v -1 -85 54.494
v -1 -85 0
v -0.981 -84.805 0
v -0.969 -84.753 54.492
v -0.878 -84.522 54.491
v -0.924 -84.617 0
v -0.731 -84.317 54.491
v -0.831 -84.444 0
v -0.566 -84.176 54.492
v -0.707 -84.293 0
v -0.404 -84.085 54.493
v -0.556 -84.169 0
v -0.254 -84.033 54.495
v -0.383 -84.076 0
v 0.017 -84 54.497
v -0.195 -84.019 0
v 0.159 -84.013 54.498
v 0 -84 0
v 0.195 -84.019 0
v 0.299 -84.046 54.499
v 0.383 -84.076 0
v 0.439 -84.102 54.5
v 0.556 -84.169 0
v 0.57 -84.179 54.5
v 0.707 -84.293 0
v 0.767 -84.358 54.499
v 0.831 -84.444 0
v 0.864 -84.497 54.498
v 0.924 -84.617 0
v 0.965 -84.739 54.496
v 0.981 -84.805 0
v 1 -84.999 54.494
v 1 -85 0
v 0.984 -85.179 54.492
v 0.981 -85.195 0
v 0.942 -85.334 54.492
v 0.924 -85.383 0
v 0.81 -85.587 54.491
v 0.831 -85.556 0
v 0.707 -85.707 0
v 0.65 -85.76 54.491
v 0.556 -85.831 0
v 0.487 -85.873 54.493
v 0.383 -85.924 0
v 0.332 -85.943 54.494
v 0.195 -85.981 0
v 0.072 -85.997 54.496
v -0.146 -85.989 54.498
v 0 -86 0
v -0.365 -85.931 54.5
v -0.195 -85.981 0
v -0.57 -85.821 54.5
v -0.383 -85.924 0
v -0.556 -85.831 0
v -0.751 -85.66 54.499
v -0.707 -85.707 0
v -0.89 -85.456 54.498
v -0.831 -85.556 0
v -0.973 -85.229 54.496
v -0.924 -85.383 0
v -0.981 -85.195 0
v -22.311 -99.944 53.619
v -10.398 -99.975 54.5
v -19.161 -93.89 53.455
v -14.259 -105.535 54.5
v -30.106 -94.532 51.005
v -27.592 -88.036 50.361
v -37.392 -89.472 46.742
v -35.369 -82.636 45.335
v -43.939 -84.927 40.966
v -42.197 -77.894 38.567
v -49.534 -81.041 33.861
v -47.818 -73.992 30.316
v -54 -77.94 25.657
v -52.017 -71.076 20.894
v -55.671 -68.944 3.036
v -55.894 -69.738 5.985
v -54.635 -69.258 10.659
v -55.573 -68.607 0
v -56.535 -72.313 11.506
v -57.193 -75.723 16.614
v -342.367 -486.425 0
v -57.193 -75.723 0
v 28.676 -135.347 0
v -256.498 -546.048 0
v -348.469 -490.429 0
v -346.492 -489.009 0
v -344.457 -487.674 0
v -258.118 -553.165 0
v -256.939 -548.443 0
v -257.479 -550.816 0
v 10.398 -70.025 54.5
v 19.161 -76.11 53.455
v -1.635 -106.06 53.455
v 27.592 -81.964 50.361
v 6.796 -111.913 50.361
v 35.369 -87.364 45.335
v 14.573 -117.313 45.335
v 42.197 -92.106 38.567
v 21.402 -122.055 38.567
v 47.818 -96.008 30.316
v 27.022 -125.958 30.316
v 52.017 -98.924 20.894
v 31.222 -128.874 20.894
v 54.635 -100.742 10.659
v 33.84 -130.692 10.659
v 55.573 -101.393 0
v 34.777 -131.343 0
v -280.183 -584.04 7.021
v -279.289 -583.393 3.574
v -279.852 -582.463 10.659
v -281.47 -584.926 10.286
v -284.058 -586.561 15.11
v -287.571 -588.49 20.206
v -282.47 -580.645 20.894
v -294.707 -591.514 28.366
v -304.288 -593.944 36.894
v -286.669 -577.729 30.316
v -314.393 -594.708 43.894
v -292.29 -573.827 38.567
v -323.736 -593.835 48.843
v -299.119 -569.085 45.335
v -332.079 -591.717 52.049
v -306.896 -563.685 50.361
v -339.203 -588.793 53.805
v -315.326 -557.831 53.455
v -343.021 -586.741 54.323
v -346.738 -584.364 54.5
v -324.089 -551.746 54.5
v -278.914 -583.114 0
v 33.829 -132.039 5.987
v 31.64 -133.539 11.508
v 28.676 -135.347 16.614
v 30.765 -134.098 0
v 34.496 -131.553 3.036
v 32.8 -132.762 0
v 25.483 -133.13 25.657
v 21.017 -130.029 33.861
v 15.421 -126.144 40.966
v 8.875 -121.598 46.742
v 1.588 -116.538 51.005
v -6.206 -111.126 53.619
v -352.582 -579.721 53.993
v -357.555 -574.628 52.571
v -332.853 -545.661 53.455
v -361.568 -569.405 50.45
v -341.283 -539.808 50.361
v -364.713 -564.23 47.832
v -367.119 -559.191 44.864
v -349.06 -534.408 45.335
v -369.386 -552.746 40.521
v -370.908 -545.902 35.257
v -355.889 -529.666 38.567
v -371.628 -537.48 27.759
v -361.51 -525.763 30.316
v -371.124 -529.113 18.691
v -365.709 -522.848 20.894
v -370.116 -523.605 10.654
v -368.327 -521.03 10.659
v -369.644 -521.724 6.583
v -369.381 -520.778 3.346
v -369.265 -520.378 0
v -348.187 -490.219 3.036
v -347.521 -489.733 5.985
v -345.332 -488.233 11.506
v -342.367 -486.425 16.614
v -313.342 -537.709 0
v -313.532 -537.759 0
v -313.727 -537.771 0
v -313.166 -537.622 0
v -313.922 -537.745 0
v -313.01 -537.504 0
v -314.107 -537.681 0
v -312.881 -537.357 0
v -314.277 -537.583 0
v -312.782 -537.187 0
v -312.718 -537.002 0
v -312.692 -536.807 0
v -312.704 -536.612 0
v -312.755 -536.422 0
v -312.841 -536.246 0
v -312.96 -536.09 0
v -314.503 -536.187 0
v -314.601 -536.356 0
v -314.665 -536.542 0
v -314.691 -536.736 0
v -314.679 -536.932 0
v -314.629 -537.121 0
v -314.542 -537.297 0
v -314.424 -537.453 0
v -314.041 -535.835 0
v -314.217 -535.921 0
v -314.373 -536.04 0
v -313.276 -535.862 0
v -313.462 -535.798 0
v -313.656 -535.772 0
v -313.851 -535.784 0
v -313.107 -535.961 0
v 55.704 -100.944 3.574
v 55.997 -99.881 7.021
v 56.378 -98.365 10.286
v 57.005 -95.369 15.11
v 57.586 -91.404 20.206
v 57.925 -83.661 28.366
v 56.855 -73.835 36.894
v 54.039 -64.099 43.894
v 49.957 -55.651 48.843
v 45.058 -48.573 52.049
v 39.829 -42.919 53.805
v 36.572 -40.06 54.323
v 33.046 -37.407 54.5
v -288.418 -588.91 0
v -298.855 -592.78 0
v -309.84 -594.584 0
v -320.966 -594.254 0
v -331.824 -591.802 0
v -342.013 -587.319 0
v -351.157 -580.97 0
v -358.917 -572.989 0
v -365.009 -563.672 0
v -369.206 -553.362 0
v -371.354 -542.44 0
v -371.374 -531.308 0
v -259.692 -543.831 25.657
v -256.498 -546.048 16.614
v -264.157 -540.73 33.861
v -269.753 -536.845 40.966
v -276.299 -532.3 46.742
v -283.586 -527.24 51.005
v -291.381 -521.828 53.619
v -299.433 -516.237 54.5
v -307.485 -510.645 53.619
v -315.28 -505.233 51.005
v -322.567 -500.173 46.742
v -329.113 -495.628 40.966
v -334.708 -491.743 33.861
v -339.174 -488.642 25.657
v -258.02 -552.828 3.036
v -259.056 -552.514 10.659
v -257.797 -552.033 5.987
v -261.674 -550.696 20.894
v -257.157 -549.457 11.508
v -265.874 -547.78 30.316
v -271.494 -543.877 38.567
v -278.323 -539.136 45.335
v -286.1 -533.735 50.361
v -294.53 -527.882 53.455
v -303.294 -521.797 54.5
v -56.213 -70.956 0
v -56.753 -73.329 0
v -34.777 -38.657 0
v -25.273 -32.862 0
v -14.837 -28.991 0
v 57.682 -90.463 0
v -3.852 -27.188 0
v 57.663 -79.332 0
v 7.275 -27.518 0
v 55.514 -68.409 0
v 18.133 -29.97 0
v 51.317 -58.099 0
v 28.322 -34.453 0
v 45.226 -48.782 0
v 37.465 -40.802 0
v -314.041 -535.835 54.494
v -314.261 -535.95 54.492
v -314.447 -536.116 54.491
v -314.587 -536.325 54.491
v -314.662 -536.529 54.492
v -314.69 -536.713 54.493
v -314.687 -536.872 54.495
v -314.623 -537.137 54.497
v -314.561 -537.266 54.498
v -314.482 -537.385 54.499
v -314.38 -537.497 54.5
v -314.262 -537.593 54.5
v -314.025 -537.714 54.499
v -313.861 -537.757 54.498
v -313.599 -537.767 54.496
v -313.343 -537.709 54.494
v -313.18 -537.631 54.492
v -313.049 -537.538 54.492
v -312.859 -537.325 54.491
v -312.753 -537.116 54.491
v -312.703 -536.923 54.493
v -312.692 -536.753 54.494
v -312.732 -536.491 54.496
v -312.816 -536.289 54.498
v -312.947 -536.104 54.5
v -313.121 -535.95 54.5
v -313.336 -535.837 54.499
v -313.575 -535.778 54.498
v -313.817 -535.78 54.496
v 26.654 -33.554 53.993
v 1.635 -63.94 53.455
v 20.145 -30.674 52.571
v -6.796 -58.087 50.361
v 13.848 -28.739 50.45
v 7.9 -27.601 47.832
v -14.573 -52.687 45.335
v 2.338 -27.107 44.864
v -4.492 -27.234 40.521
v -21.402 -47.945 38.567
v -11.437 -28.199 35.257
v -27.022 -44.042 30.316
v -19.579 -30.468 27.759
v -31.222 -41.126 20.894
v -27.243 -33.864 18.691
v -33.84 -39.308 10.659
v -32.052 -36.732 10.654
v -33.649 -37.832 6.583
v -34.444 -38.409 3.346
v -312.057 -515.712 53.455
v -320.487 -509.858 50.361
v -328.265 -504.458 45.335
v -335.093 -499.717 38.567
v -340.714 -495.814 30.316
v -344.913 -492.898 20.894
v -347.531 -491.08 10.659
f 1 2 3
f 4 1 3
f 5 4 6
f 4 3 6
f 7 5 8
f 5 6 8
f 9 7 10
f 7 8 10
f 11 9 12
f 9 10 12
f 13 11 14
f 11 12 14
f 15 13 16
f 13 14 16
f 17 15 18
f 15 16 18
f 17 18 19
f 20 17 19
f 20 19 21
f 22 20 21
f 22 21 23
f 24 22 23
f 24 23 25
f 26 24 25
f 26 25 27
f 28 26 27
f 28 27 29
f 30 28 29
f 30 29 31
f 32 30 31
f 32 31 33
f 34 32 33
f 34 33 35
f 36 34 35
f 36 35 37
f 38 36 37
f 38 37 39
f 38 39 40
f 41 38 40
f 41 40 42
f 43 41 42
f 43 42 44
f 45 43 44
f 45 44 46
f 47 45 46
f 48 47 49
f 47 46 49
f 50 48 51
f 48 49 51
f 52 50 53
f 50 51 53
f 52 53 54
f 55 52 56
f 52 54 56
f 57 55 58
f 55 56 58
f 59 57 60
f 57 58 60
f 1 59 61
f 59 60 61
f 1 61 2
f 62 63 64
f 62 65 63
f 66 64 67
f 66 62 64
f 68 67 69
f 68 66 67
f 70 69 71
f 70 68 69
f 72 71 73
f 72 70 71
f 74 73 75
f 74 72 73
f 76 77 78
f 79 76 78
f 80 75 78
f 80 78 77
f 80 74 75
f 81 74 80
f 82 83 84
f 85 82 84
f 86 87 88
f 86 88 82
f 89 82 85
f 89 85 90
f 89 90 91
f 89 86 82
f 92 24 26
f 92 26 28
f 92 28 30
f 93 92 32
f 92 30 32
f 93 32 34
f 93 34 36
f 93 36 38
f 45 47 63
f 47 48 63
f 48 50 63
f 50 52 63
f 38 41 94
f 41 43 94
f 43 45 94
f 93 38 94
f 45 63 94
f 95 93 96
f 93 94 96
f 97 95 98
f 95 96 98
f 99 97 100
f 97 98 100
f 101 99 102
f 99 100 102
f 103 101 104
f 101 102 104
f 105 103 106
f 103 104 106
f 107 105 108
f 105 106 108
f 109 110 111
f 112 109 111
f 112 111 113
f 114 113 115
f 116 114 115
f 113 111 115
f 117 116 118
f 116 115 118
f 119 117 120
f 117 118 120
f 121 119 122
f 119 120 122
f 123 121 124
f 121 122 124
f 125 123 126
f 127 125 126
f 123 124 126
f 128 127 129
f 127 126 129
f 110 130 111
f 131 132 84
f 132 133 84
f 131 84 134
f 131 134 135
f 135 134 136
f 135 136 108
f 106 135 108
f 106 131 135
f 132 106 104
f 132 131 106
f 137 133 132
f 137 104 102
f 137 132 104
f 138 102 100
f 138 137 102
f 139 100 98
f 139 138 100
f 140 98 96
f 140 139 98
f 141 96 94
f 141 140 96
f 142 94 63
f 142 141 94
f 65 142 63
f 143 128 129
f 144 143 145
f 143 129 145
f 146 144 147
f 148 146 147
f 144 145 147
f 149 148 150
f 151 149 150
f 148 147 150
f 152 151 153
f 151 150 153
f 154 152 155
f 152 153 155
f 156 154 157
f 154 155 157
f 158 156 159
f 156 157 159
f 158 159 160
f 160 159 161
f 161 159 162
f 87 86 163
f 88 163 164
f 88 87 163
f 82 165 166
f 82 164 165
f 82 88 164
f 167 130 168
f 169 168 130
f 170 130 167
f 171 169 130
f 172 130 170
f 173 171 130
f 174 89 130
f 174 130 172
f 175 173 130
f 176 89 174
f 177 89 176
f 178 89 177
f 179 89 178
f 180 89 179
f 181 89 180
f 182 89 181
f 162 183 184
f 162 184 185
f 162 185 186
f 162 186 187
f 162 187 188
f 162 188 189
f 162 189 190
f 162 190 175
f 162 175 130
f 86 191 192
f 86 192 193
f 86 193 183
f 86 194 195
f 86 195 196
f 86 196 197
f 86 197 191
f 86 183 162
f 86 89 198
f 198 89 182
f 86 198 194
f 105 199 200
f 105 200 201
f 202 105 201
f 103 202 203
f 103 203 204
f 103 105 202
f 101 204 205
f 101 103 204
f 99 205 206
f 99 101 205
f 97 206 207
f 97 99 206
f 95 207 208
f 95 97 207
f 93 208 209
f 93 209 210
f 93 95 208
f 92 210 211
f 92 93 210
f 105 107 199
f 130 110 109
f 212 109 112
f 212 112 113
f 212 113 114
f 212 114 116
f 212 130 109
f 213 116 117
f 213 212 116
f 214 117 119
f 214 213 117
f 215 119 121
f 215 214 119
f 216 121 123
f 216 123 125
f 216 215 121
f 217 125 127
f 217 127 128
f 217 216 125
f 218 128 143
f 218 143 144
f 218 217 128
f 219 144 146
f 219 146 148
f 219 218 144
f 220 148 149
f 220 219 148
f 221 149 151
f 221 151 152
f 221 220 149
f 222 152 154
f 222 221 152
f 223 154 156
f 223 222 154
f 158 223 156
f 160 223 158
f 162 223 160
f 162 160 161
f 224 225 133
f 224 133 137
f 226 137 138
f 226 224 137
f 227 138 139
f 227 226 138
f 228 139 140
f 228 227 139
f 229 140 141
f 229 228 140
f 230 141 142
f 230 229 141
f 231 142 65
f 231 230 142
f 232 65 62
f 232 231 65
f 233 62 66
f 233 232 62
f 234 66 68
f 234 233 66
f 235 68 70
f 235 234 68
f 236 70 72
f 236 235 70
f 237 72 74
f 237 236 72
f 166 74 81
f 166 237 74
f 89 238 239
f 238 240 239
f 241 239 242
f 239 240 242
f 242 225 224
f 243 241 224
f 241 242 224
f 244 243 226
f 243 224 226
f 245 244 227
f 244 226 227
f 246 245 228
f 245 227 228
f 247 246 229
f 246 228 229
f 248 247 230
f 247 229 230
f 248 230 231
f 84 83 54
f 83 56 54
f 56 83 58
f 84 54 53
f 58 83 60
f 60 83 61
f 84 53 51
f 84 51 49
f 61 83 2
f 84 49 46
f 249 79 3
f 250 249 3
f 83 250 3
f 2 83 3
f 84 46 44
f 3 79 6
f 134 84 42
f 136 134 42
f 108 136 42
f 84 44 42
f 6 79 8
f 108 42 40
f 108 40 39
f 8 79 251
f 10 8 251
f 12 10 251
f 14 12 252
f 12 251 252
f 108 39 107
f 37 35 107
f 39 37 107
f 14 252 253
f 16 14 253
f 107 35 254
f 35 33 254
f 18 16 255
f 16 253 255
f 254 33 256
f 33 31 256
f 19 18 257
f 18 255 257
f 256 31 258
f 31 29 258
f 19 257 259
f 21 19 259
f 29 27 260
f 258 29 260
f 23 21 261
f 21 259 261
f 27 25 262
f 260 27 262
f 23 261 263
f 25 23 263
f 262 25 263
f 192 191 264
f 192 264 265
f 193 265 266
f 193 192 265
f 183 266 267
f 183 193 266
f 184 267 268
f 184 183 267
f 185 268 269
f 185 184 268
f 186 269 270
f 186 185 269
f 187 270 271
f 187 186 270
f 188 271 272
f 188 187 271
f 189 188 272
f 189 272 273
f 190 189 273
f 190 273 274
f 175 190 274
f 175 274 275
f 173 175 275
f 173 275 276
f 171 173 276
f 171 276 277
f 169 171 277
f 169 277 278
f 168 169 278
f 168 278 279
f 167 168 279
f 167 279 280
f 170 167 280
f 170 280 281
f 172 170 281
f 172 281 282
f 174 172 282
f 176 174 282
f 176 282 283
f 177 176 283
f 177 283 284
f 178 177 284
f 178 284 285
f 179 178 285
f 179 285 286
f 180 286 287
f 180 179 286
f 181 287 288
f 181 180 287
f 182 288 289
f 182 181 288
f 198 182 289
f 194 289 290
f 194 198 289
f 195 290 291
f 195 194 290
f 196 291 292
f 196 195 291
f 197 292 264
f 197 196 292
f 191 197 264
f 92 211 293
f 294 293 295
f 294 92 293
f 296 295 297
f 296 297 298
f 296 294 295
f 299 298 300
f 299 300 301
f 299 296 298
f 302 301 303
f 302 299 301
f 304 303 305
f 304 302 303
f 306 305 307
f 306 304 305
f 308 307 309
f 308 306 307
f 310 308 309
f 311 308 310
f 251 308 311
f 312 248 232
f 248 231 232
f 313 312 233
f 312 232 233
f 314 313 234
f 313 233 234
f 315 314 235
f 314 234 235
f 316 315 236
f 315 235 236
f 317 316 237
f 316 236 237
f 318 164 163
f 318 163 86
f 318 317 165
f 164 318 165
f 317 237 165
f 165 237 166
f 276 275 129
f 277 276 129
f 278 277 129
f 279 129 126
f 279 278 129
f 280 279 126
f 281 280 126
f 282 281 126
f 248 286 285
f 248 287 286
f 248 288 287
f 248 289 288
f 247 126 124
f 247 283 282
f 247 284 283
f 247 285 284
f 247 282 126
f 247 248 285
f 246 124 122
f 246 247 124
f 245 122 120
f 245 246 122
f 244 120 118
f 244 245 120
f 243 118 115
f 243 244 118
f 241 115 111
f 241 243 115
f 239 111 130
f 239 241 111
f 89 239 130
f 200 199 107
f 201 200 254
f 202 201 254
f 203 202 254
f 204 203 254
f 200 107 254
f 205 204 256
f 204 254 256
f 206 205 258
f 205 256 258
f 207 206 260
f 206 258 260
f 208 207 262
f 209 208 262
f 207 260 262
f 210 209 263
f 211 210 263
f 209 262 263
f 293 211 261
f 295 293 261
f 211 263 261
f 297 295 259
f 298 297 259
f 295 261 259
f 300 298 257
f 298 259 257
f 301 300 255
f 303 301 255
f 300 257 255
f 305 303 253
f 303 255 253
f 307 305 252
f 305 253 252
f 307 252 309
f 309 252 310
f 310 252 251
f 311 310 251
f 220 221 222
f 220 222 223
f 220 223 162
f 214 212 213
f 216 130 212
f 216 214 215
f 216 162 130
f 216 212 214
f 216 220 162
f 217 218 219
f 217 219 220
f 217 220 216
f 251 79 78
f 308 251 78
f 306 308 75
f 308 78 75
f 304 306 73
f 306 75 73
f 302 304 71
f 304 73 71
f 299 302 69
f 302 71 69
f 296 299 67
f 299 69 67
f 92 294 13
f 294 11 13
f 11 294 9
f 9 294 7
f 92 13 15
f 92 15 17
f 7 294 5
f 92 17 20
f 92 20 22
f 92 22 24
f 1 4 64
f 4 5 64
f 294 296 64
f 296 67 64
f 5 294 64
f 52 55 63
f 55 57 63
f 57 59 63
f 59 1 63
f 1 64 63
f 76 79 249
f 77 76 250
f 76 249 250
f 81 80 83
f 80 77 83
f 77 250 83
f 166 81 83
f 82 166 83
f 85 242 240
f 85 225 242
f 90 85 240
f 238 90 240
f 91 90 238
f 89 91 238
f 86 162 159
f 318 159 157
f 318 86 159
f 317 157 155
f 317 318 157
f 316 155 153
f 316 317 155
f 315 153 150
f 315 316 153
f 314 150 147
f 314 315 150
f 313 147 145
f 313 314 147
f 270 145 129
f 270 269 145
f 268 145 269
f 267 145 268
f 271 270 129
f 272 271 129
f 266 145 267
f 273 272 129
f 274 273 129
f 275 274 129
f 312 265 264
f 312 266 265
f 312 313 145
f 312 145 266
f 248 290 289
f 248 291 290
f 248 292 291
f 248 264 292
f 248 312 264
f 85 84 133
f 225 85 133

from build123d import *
from build123d.topology import SkipClean

# Parameters (mm, degrees)
BOSS_EXTRUDE1_START     = -88.049944887
BOSS_EXTRUDE1_DEPTH     = 36.461390913
BOSS_EXTRUDE1_2_DEPTH   = 54.5
BOSS_EXTRUDE1_START_2   = -94.81924943
BOSS_EXTRUDE1_3_DEPTH   = 83.81924943
CUT_EXTRUDE2_REACH      = 158.991
CUT_EXTRUDE2_END_RADIUS = 55
SKETCH6_R               = 1
BOSS_EXTRUDE3_START     = 500
BOSS_EXTRUDE3_DEPTH     = 500


with BuildPart() as part:
    # Boss-Extrude1: read off the stored shape, not the designer's step
    # Boss-Extrude1 outline → Boss-Extrude1 (new body)
    with BuildSketch(Plane(origin=(0, 0, 0), x_dir=(0.8214029344741598, -0.570348331493342, 0), z_dir=(0.570348331493342, 0.8214029344741599, 0)).offset(BOSS_EXTRUDE1_START)):
        with BuildLine():
            Line((103.477335403, 0), (-6.518119049, 0))
            ThreePointArc((-6.518119049, 0), (48.479608177, -54.5), (103.477335403, 0))
        make_face()
    boss_extrude1 = extrude(amount=BOSS_EXTRUDE1_DEPTH)

    # Boss-Extrude1 2 outline → Boss-Extrude1 2 (add)
    with BuildSketch(Plane.XY):
        with BuildLine():
            ThreePointArc((-55.573141325, -68.606884869), (-56.495275826, -72.13951518), (-57.193088924, -75.72320962))
            Line((-57.193088924, -75.72320962), (28.67567235, -135.346937104))
            ThreePointArc((28.67567235, -135.346937104), (31.789672436, -133.440943291), (34.77744774, -131.342608787))
            Line((34.77744774, -131.342608787), (-55.573141325, -68.606884869))
        make_face()
        with BuildLine():
            ThreePointArc((55.573141325, -101.393115131), (33.046300577, -37.40745564), (-34.77744774, -38.657391213))
            Line((-34.77744774, -38.657391213), (55.573141325, -101.393115131))
        make_face()
    boss_extrude1_2 = extrude(amount=BOSS_EXTRUDE1_2_DEPTH)

    # Boss-Extrude1 3 outline → Boss-Extrude1 3 (cut)
    with SkipClean():  # the faces are left unmerged after this step: merging them gives an invalid solid
        with BuildSketch(Plane(origin=(0, 0, 0), x_dir=(0.8214029344741598, -0.570348331493342, 0), z_dir=(0.570348331493342, 0.8214029344741599, 0)).offset(BOSS_EXTRUDE1_START_2)):
            with BuildLine():
                ThreePointArc((48.479608177, -54.5), (9.765915509, -38.567249711), (-6.518119049, 0))
                Line((-6.518119049, 0), (-6.536301619, 2))
                Line((-6.536301619, 2), (-8, 2))
                Line((-8, 2), (-8, -56))
                Line((-8, -56), (105, -56))
                Line((105, -56), (105, 2))
                Line((105, 2), (103.495517973, 2))
                Line((103.495517973, 2), (103.477335403, 0))
                ThreePointArc((103.477335403, 0), (87.193300845, -38.567249711), (48.479608177, -54.5))
            make_face()
        boss_extrude1_3 = extrude(amount=BOSS_EXTRUDE1_3_DEPTH, mode=Mode.SUBTRACT)

    # Cut-Extrude2: up to this cylinder (the profile starts inside it)
    with SkipClean():  # the faces are left unmerged after this step: merging them gives an invalid solid
        cut_extrude2_end = Plane(origin=(0, -85, -0.5), z_dir=(0.5703483314933416, 0.82140293447416, 0)) * Cylinder(CUT_EXTRUDE2_END_RADIUS, 428.982, mode=Mode.PRIVATE)
        # Sketch6 → Cut-Extrude2 (cut, up to the surface)
        with BuildSketch(Plane(origin=(0, 0, 0), x_dir=(-1, 0, 0), z_dir=(0, 0, -1)), mode=Mode.PRIVATE) as cut_extrude2_sk1:
            with Locations((0, -85)):
                Circle(SKETCH6_R)
        cut_extrude2_tool1 = extrude(cut_extrude2_sk1.sketch, amount=-CUT_EXTRUDE2_REACH, mode=Mode.PRIVATE) & cut_extrude2_end
        cut_extrude2 = cut_extrude2_tool1.solids().sort_by_distance((0, -85, 0))[0]
        add(cut_extrude2, mode=Mode.SUBTRACT)

    # Sketch5 → Boss-Extrude3 (add)
    with SkipClean():  # the faces are left unmerged after this step: merging them gives an invalid solid
        with BuildSketch(Plane(origin=(-54.080000706, -77.884809727, 0), x_dir=(0.8214029344741602, -0.5703483314933416, 0), z_dir=(-0.5703483314933416, -0.8214029344741602, 0)).offset(BOSS_EXTRUDE3_START)):
            with BuildLine():
                Line((-3.789964812, 16.614080154), (-3.789964812, 0))
                Line((-3.789964812, 0), (100.749181166, 0))
                Line((100.749181166, 0), (100.749181166, 16.614080154))
                ThreePointArc((100.749181166, 16.614080154), (48.479608177, 54.5), (-3.789964812, 16.614080154))
            make_face()
        extrude(amount=-BOSS_EXTRUDE3_DEPTH)

    # Mirror1: Boss-Extrude1, Boss-Extrude1 2, Boss-Extrude1 3, Cut-Extrude2 across plane
    with SkipClean():  # the faces are left unmerged after this step: merging them gives an invalid solid
        add(boss_extrude1.mirror(Plane(origin=(-196.667083579, -283.235543345, 0), x_dir=(0, 0, 1), z_dir=(-0.5703483314933416, -0.8214029344741602, 0))))
        add(boss_extrude1_2.mirror(Plane(origin=(-196.667083579, -283.235543345, 0), x_dir=(0, 0, 1), z_dir=(-0.5703483314933416, -0.8214029344741602, 0))))
        add(boss_extrude1_3.mirror(Plane(origin=(-196.667083579, -283.235543345, 0), x_dir=(0, 0, 1), z_dir=(-0.5703483314933416, -0.8214029344741602, 0))), mode=Mode.SUBTRACT)
        add(cut_extrude2.mirror(Plane(origin=(-196.667083579, -283.235543345, 0), x_dir=(0, 0, 1), z_dir=(-0.5703483314933416, -0.8214029344741602, 0))), mode=Mode.SUBTRACT)


solid = part.part
